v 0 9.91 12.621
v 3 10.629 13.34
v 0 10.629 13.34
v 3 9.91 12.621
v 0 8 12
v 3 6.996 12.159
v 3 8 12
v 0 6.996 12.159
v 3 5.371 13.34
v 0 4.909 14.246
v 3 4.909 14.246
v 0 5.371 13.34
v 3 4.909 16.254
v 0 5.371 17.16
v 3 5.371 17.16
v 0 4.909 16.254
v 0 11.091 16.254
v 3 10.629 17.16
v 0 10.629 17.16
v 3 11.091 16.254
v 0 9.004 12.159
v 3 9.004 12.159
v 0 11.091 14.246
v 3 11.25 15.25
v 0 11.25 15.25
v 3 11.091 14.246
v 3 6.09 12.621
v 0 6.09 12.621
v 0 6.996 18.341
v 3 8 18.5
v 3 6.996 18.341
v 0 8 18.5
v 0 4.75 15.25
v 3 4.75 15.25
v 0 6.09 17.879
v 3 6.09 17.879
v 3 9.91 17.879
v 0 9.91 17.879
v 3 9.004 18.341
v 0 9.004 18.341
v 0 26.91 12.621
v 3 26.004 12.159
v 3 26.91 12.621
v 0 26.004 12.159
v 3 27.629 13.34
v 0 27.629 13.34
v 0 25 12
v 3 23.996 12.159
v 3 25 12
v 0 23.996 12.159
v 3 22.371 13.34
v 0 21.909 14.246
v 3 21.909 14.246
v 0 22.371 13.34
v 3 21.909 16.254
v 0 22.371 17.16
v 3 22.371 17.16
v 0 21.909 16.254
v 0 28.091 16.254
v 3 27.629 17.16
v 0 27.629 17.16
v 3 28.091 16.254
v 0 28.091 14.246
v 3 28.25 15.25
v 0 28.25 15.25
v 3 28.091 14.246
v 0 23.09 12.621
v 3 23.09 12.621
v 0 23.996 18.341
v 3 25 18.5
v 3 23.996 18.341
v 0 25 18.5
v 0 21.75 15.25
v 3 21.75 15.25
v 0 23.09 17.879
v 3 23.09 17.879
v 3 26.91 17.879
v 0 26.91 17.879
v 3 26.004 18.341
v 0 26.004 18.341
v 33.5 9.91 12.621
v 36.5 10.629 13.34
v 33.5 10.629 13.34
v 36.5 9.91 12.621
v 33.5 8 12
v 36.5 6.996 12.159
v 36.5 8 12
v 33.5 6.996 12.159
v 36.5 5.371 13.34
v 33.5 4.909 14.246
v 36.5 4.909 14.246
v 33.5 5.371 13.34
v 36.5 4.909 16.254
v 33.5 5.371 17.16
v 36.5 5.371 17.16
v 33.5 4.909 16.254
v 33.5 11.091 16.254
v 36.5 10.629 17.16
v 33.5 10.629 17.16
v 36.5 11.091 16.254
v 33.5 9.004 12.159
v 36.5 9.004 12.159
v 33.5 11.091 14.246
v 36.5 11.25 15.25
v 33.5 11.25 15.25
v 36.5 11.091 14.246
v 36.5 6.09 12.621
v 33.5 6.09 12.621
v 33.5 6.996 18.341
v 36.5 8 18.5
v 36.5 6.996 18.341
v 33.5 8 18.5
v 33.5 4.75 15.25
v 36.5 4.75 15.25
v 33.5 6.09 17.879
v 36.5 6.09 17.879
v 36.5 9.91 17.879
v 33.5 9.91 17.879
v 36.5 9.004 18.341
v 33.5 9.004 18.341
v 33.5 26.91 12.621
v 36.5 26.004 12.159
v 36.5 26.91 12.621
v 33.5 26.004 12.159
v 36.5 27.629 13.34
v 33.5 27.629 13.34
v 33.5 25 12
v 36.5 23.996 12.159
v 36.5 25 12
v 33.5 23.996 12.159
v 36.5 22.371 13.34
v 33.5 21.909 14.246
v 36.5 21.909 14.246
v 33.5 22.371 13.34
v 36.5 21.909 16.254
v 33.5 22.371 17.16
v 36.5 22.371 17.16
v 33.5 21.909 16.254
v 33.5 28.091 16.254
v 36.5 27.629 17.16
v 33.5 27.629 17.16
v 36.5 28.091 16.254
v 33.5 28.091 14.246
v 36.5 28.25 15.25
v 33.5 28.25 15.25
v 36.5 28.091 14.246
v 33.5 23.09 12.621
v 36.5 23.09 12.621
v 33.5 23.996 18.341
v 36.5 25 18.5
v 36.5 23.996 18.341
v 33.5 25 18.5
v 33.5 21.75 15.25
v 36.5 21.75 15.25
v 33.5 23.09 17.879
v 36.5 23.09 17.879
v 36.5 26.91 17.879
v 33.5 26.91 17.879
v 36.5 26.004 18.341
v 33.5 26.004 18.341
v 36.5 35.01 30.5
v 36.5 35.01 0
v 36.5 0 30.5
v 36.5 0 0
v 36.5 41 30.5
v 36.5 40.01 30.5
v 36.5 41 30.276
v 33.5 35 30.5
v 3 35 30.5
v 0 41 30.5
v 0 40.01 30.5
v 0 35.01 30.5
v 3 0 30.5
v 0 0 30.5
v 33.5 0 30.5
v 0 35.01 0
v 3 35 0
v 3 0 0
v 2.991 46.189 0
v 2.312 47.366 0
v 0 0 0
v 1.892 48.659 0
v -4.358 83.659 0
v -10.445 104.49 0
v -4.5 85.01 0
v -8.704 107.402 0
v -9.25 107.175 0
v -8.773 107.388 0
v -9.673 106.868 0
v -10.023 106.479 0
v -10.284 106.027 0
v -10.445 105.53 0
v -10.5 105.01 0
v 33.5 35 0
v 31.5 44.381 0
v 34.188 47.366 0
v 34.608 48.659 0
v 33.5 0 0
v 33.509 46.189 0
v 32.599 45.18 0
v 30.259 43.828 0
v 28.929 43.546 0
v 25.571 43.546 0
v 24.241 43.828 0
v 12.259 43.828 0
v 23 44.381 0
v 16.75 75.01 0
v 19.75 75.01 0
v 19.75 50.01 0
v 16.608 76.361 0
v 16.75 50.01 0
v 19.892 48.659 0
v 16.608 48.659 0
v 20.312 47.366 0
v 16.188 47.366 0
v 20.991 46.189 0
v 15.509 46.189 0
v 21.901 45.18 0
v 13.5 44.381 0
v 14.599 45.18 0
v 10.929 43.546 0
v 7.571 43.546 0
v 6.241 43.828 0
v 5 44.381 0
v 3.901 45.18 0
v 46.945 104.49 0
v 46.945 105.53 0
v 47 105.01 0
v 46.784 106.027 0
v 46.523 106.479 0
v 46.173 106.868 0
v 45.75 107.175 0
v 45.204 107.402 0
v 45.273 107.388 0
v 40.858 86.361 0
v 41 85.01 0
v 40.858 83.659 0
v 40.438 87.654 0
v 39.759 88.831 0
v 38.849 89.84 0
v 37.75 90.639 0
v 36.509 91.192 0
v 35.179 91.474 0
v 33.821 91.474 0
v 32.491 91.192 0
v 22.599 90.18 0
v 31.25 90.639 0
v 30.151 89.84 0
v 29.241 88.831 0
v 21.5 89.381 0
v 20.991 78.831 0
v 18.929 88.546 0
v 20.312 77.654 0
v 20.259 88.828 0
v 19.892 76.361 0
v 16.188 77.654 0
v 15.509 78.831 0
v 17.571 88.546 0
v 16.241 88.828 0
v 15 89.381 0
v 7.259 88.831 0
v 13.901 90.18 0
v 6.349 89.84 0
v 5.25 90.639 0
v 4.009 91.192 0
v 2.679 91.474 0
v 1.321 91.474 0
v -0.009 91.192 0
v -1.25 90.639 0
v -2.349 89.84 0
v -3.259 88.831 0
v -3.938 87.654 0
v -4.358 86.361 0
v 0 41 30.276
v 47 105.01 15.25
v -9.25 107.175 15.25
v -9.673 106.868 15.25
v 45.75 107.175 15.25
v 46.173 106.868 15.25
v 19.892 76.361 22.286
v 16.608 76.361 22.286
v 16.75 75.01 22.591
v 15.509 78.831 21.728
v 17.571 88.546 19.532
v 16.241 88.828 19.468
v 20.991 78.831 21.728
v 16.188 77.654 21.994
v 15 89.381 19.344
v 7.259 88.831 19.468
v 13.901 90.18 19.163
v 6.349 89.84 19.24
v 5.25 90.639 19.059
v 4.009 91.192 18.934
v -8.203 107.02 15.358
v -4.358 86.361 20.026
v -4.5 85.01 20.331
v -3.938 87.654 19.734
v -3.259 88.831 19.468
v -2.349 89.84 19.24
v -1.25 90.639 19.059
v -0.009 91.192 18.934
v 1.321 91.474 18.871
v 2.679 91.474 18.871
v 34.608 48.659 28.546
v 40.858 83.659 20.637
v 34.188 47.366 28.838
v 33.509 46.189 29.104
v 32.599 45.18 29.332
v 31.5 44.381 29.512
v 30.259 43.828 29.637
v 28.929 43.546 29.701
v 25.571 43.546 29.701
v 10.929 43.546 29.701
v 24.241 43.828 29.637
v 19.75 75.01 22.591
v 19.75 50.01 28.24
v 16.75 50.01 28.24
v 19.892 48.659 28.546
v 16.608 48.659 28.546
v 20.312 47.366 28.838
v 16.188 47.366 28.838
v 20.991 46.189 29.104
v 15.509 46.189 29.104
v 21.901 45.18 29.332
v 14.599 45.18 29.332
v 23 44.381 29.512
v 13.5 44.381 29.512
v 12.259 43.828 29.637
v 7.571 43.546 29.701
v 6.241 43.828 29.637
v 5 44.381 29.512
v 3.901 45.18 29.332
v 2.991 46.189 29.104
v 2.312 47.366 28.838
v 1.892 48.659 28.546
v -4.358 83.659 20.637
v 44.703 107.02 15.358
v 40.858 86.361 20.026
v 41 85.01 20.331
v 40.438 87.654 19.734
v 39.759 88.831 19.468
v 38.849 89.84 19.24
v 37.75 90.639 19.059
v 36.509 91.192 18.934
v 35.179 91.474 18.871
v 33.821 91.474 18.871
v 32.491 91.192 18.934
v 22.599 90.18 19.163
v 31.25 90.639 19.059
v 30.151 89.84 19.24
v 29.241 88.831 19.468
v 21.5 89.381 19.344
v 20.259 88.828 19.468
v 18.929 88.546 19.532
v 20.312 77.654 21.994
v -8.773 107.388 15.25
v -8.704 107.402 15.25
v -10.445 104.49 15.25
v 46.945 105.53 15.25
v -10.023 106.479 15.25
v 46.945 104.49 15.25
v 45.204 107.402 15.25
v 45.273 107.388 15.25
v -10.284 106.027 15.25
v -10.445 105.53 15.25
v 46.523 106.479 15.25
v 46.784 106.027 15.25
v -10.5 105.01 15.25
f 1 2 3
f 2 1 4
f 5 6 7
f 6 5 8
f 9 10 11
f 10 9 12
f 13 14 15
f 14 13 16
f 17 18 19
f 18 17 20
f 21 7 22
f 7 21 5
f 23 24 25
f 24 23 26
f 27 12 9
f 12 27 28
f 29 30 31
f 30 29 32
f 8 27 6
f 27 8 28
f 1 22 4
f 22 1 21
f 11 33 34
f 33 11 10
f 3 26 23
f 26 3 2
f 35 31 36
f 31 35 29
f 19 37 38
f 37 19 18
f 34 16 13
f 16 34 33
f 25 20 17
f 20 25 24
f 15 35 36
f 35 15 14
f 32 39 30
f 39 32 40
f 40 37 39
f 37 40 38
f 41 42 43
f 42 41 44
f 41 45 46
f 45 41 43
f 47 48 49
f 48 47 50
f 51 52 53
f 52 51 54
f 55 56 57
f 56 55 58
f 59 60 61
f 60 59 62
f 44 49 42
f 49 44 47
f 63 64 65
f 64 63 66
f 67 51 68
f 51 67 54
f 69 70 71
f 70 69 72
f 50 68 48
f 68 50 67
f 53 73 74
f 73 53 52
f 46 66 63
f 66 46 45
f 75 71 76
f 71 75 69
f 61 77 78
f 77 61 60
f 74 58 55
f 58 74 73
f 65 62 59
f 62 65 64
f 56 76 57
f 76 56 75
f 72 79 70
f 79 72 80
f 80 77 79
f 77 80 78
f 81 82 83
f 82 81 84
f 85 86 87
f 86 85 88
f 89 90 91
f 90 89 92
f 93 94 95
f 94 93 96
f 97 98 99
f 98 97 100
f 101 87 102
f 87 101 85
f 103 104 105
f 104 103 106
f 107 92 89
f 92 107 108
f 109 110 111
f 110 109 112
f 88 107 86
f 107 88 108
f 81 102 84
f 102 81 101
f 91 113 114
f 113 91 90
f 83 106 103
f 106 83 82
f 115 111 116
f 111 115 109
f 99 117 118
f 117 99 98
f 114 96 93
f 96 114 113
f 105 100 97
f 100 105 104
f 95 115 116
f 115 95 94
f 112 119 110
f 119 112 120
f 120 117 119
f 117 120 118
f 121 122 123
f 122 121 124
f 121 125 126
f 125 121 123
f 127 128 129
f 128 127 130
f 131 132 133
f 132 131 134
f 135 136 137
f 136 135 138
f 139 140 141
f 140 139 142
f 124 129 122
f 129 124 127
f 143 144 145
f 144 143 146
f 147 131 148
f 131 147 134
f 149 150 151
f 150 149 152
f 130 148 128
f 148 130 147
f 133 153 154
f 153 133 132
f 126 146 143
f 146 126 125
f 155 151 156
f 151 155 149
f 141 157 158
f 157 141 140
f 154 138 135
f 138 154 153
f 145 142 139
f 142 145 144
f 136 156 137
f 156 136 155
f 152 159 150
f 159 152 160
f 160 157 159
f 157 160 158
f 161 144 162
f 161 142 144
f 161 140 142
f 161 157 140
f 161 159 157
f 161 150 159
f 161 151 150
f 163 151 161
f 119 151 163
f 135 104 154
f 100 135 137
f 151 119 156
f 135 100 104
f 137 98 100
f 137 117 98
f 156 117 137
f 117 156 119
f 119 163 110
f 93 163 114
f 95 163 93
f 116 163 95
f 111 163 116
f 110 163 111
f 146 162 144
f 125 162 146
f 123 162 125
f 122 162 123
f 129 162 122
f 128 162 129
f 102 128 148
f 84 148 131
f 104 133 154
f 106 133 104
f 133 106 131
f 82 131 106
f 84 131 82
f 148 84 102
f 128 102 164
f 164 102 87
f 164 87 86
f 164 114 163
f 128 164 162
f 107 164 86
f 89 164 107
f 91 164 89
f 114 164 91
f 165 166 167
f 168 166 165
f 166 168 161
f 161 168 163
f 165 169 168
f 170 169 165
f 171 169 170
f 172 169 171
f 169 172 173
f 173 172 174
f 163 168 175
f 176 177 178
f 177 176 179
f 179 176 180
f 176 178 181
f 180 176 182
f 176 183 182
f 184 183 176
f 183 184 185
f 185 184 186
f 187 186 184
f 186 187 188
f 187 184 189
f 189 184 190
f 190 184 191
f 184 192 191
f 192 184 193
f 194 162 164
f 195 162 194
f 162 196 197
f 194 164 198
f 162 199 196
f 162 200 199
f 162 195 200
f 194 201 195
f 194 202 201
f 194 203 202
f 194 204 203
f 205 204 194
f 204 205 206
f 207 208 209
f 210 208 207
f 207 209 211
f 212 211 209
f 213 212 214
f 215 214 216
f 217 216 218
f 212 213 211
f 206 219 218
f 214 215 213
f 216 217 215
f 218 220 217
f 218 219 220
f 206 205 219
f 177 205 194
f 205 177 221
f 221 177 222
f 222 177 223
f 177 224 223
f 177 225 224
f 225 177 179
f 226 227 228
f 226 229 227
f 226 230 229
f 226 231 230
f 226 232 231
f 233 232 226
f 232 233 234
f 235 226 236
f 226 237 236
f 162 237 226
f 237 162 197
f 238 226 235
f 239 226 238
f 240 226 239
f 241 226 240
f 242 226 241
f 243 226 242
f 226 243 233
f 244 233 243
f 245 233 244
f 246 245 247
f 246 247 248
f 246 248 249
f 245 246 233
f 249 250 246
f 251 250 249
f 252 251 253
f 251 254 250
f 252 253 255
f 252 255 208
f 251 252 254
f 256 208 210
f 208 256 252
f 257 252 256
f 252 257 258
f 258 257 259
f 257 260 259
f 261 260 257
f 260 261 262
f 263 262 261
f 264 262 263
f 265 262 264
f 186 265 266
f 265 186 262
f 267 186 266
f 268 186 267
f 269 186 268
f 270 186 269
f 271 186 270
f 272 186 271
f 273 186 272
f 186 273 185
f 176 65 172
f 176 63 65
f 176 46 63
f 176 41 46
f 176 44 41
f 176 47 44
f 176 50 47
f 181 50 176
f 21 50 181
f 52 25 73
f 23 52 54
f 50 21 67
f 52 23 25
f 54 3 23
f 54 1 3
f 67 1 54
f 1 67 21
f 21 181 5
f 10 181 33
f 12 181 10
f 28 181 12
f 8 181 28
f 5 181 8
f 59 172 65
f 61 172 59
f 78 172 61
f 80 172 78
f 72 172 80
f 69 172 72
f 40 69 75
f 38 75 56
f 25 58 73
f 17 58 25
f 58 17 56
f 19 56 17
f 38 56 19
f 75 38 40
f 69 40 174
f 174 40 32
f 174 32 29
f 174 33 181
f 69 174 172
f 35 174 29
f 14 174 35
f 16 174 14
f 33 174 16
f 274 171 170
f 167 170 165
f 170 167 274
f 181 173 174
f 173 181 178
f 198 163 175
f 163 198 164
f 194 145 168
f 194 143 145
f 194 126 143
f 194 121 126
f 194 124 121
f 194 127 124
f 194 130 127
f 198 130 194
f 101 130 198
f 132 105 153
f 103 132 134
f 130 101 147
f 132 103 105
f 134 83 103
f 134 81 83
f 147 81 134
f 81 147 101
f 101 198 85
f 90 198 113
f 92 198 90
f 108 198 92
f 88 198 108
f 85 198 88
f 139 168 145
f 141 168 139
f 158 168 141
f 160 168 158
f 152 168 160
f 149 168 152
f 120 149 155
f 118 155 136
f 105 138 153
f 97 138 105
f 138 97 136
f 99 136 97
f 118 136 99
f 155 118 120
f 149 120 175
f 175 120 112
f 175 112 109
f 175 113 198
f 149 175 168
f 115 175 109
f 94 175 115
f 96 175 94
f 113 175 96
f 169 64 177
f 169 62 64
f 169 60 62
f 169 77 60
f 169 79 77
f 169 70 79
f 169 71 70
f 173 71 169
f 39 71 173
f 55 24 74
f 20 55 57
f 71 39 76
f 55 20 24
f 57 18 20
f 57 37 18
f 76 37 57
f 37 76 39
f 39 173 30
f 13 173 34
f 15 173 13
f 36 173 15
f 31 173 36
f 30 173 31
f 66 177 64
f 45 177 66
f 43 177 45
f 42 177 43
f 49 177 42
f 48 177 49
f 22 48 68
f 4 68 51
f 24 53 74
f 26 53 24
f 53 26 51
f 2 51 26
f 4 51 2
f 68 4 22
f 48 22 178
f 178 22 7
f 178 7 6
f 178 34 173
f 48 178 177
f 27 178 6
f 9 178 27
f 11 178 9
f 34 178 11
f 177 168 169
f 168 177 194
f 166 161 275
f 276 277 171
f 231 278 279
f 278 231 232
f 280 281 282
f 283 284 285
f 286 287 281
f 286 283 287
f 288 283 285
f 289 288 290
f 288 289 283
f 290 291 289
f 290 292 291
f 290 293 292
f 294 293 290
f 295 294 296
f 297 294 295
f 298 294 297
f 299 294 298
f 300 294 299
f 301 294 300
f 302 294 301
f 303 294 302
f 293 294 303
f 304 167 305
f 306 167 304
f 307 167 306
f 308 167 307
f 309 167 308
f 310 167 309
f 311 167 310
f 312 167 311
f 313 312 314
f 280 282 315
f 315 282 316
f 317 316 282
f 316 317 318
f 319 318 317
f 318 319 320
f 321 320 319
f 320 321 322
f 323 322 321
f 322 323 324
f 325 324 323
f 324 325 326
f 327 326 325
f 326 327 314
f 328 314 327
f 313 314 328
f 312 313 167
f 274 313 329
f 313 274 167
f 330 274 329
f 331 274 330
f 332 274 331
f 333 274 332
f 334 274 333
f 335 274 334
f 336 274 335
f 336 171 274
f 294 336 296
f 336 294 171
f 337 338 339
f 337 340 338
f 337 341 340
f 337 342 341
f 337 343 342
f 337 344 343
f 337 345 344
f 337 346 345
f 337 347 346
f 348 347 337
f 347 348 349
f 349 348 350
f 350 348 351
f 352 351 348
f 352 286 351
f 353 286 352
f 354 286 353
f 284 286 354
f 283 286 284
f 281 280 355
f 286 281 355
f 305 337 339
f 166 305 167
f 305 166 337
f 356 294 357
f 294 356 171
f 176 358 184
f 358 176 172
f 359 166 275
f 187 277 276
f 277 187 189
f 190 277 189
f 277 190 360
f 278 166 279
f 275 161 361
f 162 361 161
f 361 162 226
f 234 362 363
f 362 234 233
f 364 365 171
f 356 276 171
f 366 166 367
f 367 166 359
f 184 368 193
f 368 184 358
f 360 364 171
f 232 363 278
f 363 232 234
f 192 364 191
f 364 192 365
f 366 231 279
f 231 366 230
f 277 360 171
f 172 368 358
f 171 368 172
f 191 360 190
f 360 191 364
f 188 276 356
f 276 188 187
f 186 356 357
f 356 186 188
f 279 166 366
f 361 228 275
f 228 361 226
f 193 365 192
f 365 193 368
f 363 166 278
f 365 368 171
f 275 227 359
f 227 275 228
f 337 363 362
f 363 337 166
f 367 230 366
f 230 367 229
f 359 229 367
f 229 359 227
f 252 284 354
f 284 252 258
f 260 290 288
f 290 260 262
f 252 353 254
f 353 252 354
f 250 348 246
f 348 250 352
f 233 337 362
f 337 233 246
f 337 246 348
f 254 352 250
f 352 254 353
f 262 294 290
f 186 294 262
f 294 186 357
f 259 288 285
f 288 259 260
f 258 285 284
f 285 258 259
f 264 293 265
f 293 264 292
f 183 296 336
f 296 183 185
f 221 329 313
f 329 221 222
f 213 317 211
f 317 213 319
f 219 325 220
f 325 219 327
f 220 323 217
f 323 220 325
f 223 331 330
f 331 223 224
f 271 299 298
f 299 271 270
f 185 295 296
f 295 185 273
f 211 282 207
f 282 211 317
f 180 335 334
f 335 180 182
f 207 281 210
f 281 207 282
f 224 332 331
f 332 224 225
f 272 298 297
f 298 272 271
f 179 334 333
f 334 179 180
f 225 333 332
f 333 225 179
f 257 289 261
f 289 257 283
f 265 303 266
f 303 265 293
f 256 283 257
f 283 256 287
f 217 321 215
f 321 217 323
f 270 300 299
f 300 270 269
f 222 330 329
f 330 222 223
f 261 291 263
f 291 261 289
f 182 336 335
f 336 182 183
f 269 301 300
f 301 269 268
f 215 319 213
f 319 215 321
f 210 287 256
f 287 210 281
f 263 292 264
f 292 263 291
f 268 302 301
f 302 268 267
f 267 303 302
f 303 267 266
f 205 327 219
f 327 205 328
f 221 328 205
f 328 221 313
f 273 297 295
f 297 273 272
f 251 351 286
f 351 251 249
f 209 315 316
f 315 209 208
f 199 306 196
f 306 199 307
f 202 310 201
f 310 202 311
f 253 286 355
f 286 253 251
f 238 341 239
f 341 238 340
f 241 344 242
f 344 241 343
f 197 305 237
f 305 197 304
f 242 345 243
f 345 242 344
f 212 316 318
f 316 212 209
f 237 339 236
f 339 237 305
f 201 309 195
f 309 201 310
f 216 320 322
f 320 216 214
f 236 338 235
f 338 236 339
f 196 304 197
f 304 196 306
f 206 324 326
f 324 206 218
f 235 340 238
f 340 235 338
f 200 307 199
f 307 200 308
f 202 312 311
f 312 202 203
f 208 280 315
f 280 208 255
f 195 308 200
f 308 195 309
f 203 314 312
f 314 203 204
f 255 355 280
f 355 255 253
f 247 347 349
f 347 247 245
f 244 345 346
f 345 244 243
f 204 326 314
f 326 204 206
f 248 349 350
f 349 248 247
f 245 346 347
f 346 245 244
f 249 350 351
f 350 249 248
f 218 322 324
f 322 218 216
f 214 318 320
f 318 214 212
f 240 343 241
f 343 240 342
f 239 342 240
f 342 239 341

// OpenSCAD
// file: ../lib/ALU_profile_holder_top.scad
include <../../parameters.scad>



module ALU_profile_holder_top(deep=35) {
    wall_thickness = ALU_profile_holder_wall_thickness;
    
    module screw_holes() {
        translate([wall_thickness/2, 8, ALU_profile_width/2]) {
            rotate([0, 90, 0]) 
                cylinder(d=M6_screw_diameter, h=wall_thickness*2, center=true, $fn=20);
        }
        translate([wall_thickness/2, deep-10, ALU_profile_width/2]) {
                rotate([0, 90, 0])
                cylinder(d=M6_screw_diameter, h=wall_thickness*2, center=true, $fn=20);
            
        }
    }
    
    difference() {
        cube([ALU_profile_width+wall_thickness*2, deep+wall_thickness*2, ALU_profile_width]);
        translate([wall_thickness, -0.1, -0.1])
            cube([ALU_profile_width, deep+0.1, ALU_profile_width+0.2]);
        
        screw_holes();
        translate([ALU_profile_width+wall_thickness, 0, 0])
            screw_holes();
    }
}

ALU_profile_holder_top(35);
// file: ../888_1001.scad
include <../parameters.scad>
use <./lib/ALU_profile_holder_top.scad>



module 888_1001() {
	translate([0, 35.01, 0])
	difference() {
		union() {
			hull() {
				cube([ALU_profile_width+ALU_profile_holder_wall_thickness*2, 5, ALU_profile_width]);

				translate([ALU_profile_width+ALU_profile_holder_wall_thickness*2+8, 70, 0])
				cylinder(d=5, h=ALU_profile_width/2, $fn=30);

				translate([-8, 70, 0])
				cylinder(d=5, h=ALU_profile_width/2, $fn=30);
			}

			translate([0, -35.01, 0])
			ALU_profile_holder_top();
		}
		

		// tube hole
		translate([0, 0, -1])
		hull() {
			translate([ALU_profile_width/2+ALU_profile_holder_wall_thickness, 60, 0])
			cylinder(d=lock_grab_axle_dia, h=ALU_profile_width+2, $fn=30);

			translate([ALU_profile_width+ALU_profile_holder_wall_thickness*2+8, 80, 0])
			cylinder(d=lock_grab_axle_dia, h=ALU_profile_width+2, $fn=30);

			translate([-8, 80, 0])
			cylinder(d=lock_grab_axle_dia, h=ALU_profile_width+2, $fn=30);
		}

		// middle body hole
		translate([0, 0, -1])
		hull() {
			translate([ALU_profile_width/2+ALU_profile_holder_wall_thickness-8, 15, 0])
			cylinder(d=lock_grab_axle_dia, h=ALU_profile_width+2, $fn=30);

			translate([ALU_profile_width/2+ALU_profile_holder_wall_thickness-10, 15, 0])
			cylinder(d=lock_grab_axle_dia, h=ALU_profile_width+2, $fn=30);

			translate([ALU_profile_width/2+ALU_profile_holder_wall_thickness-8, 40, 0])
			cylinder(d=lock_grab_axle_dia, h=ALU_profile_width+2, $fn=30);

			translate([2, 50, 0])

			cylinder(d=lock_grab_axle_dia, h=ALU_profile_width+2, $fn=30);
		}

		mirror([1, 0, 0])
		translate([-ALU_profile_width-ALU_profile_holder_wall_thickness*2, 0, -1])
		hull() {
			translate([ALU_profile_width/2+ALU_profile_holder_wall_thickness-8, 15, 0])
			cylinder(d=lock_grab_axle_dia, h=ALU_profile_width+2, $fn=30);

			translate([ALU_profile_width/2+ALU_profile_holder_wall_thickness-10, 15, 0])
			cylinder(d=lock_grab_axle_dia, h=ALU_profile_width+2, $fn=30);

			translate([ALU_profile_width/2+ALU_profile_holder_wall_thickness-8, 40, 0])
			cylinder(d=lock_grab_axle_dia, h=ALU_profile_width+2, $fn=30);

			translate([2, 50, 0])
			cylinder(d=lock_grab_axle_dia, h=ALU_profile_width+2, $fn=30);
		}
	}
}

888_1001();
// file: ../../parameters.scad
maximum_printable_size = 150;

layer_thickness = 0.3;
global_clearance = 0.5;


//Screw diameter and nut for M10 [mm]
M10_screw_diameter = 10.4;
M10_head_height = 10;
M10_head_diameter = 16+0.5;
M10_nut_height = 10.5;
M10_nut_diameter = 25.5;
M10_nut_pocket = 22.3;

//Screw diameter for M8 [mm]
M8_screw_diameter = 8.6;
M8_head_height = 8;
M8_head_diameter = 13.5;
M8_nut_height = 7.5;
M8_square_nut_thin_height = 4.5;
M8_nut_diameter = 14.4 + 0.5;
M8_nut_pocket = 13 + 0.5;
M8_washer_diameter = 16;
M8_washer_thickness = 1.5;


//Screw diameter and nut for M6 [mm]
M6_screw_diameter=6.5;
M6_head_diameter = 10+0.5;
M6_head_height = 6;
M6_nut_height = 4.9;
M6_nut_diameter = 11.8;
M6_nut_pocket = 10.4;
M6_square_nut_height = 3;
M6_square_nut_diameter = 10;
M6_washer_thickness = 1.6;

//Screw diameter and nut for M5 [mm]
M5_screw_diameter=5.5;
M5_head_height = 5;
M5_head_diameter = 13+0.5;
M5_nut_height = 4.5;
M5_nut_diameter = 9.4;
M5_nut_pocket = 8.4;

//Screw diameter and nut for M4 [mm]
M4_screw_diameter=4.5;
M4_screw_head_height = 4;
M4_nut_height = 3.2;
M4_nut_diameter = 8.4;
M4_nut_pocket = 7.5;

//Screw diameter and nut for M3 [mm]
M3_screw_diameter = 3.2;
M3_nut_height = 2.7;
M3_nut_diameter = 6.6;
M3_nut_pocket = 5.6;
M3_screw_head_height = 3;

//Screw diameter and nut for M2,5 [mm]
M2_5_screw_diameter = 2.7;
M2_5_nut_height = 2.3;
M2_5_nut_diameter = 6;
M2_5_nut_pocket = 5.5;

//ALU profile
ALU_profile_width = 30.5;
ALU_profile_holder_wall_thickness = 3;
ALU_profile_groove_width = 8;





// Platform parameters ////////////////////////////////////////////
// Main profile parameters
starting_platform_length = 1000; // Main platform profile length
starting_platform_angle = 10; // Angle of attack for platform

// Main cube profile lengths
profile_length_x = 600;
profile_length_y = 600;
profile_length_z = 260;


// Compressor dimensions
compressor_length_x = 410;
compressor_length_y = 140;
compressor_length_z = 310;

// Platform front support parameters
front_holder_width = 160;
front_holder_angle = 25;
front_holder_height = 60;
front_holder_offset = 15;
front_holder_height_offset = 110;

// Lock moving servo parameters
// static par.
servo_length = 40;
servo_width = 20;
servo_height = 40;
servo_axle_offset = 12.5;
servo_axle_height = 5;
servo_movement_angle = 60;
servo_movement_angle_offset = -35; // angle offset up
servo_force = 1.65; // [N/m] torque of servo

// dynamic par.
servo_arm_length = servo_width/2+ALU_profile_width/2+ALU_profile_holder_wall_thickness+4;
servo_travel_y = cos((servo_movement_angle-abs(servo_movement_angle_offset))/2)*servo_arm_length;
servo_arm_hole_length = (servo_arm_length/cos(servo_movement_angle/2))-servo_arm_length+M3_screw_diameter;
servo_joint_offset = sin(servo_movement_angle+servo_movement_angle_offset)*(servo_arm_length+servo_arm_hole_length)+servo_axle_offset;
servo_joint_offset_by_angle = -tan(servo_movement_angle_offset)*servo_arm_length;
servo_max_linear_force = servo_force/(servo_arm_length/1000); // max servo linear force [N]
servo_min_linear_force = cos(servo_movement_angle+abs(servo_movement_angle_offset))*servo_max_linear_force; // min servo linear force [N] in the most extreme position
servo_holding_linear_force = cos(servo_movement_angle+servo_movement_angle_offset)*servo_max_linear_force; // min servo linear force [N] in holding position

// Lock static parameters
lock_screws_dia = 3.2;
lock_depth = 20;
lock_axle_diameter = 15;
lock_grab_axle_dia = 13;
lock_arms_joint_offset = 30;
lock_arms_joint_angle = 90-.01;
lock_tooth_width = 2;

lock_tube_angle = 0;

// Lock dynamic parameters
lock_push_force = (servo_holding_linear_force/cos(lock_arms_joint_angle))/cos(lock_arms_joint_angle); // lock arm pushing force on linear servo joint
lock_push_arm_length = 45;
lock_arm_force_ratio = 1; // lock arm change holding force ratio (0.5 = arm will have half holding force)
lock_hold_arm_length = lock_push_arm_length/lock_arm_force_ratio;
lock_holding_force = lock_push_force*lock_arm_force_ratio;
lock_joint_arm_length = lock_push_arm_length;
// main file
//@set_slicing_config(../../slicing/default.ini)


include <../../parameters.scad>

use <../888_1001.scad>

888_1001();
